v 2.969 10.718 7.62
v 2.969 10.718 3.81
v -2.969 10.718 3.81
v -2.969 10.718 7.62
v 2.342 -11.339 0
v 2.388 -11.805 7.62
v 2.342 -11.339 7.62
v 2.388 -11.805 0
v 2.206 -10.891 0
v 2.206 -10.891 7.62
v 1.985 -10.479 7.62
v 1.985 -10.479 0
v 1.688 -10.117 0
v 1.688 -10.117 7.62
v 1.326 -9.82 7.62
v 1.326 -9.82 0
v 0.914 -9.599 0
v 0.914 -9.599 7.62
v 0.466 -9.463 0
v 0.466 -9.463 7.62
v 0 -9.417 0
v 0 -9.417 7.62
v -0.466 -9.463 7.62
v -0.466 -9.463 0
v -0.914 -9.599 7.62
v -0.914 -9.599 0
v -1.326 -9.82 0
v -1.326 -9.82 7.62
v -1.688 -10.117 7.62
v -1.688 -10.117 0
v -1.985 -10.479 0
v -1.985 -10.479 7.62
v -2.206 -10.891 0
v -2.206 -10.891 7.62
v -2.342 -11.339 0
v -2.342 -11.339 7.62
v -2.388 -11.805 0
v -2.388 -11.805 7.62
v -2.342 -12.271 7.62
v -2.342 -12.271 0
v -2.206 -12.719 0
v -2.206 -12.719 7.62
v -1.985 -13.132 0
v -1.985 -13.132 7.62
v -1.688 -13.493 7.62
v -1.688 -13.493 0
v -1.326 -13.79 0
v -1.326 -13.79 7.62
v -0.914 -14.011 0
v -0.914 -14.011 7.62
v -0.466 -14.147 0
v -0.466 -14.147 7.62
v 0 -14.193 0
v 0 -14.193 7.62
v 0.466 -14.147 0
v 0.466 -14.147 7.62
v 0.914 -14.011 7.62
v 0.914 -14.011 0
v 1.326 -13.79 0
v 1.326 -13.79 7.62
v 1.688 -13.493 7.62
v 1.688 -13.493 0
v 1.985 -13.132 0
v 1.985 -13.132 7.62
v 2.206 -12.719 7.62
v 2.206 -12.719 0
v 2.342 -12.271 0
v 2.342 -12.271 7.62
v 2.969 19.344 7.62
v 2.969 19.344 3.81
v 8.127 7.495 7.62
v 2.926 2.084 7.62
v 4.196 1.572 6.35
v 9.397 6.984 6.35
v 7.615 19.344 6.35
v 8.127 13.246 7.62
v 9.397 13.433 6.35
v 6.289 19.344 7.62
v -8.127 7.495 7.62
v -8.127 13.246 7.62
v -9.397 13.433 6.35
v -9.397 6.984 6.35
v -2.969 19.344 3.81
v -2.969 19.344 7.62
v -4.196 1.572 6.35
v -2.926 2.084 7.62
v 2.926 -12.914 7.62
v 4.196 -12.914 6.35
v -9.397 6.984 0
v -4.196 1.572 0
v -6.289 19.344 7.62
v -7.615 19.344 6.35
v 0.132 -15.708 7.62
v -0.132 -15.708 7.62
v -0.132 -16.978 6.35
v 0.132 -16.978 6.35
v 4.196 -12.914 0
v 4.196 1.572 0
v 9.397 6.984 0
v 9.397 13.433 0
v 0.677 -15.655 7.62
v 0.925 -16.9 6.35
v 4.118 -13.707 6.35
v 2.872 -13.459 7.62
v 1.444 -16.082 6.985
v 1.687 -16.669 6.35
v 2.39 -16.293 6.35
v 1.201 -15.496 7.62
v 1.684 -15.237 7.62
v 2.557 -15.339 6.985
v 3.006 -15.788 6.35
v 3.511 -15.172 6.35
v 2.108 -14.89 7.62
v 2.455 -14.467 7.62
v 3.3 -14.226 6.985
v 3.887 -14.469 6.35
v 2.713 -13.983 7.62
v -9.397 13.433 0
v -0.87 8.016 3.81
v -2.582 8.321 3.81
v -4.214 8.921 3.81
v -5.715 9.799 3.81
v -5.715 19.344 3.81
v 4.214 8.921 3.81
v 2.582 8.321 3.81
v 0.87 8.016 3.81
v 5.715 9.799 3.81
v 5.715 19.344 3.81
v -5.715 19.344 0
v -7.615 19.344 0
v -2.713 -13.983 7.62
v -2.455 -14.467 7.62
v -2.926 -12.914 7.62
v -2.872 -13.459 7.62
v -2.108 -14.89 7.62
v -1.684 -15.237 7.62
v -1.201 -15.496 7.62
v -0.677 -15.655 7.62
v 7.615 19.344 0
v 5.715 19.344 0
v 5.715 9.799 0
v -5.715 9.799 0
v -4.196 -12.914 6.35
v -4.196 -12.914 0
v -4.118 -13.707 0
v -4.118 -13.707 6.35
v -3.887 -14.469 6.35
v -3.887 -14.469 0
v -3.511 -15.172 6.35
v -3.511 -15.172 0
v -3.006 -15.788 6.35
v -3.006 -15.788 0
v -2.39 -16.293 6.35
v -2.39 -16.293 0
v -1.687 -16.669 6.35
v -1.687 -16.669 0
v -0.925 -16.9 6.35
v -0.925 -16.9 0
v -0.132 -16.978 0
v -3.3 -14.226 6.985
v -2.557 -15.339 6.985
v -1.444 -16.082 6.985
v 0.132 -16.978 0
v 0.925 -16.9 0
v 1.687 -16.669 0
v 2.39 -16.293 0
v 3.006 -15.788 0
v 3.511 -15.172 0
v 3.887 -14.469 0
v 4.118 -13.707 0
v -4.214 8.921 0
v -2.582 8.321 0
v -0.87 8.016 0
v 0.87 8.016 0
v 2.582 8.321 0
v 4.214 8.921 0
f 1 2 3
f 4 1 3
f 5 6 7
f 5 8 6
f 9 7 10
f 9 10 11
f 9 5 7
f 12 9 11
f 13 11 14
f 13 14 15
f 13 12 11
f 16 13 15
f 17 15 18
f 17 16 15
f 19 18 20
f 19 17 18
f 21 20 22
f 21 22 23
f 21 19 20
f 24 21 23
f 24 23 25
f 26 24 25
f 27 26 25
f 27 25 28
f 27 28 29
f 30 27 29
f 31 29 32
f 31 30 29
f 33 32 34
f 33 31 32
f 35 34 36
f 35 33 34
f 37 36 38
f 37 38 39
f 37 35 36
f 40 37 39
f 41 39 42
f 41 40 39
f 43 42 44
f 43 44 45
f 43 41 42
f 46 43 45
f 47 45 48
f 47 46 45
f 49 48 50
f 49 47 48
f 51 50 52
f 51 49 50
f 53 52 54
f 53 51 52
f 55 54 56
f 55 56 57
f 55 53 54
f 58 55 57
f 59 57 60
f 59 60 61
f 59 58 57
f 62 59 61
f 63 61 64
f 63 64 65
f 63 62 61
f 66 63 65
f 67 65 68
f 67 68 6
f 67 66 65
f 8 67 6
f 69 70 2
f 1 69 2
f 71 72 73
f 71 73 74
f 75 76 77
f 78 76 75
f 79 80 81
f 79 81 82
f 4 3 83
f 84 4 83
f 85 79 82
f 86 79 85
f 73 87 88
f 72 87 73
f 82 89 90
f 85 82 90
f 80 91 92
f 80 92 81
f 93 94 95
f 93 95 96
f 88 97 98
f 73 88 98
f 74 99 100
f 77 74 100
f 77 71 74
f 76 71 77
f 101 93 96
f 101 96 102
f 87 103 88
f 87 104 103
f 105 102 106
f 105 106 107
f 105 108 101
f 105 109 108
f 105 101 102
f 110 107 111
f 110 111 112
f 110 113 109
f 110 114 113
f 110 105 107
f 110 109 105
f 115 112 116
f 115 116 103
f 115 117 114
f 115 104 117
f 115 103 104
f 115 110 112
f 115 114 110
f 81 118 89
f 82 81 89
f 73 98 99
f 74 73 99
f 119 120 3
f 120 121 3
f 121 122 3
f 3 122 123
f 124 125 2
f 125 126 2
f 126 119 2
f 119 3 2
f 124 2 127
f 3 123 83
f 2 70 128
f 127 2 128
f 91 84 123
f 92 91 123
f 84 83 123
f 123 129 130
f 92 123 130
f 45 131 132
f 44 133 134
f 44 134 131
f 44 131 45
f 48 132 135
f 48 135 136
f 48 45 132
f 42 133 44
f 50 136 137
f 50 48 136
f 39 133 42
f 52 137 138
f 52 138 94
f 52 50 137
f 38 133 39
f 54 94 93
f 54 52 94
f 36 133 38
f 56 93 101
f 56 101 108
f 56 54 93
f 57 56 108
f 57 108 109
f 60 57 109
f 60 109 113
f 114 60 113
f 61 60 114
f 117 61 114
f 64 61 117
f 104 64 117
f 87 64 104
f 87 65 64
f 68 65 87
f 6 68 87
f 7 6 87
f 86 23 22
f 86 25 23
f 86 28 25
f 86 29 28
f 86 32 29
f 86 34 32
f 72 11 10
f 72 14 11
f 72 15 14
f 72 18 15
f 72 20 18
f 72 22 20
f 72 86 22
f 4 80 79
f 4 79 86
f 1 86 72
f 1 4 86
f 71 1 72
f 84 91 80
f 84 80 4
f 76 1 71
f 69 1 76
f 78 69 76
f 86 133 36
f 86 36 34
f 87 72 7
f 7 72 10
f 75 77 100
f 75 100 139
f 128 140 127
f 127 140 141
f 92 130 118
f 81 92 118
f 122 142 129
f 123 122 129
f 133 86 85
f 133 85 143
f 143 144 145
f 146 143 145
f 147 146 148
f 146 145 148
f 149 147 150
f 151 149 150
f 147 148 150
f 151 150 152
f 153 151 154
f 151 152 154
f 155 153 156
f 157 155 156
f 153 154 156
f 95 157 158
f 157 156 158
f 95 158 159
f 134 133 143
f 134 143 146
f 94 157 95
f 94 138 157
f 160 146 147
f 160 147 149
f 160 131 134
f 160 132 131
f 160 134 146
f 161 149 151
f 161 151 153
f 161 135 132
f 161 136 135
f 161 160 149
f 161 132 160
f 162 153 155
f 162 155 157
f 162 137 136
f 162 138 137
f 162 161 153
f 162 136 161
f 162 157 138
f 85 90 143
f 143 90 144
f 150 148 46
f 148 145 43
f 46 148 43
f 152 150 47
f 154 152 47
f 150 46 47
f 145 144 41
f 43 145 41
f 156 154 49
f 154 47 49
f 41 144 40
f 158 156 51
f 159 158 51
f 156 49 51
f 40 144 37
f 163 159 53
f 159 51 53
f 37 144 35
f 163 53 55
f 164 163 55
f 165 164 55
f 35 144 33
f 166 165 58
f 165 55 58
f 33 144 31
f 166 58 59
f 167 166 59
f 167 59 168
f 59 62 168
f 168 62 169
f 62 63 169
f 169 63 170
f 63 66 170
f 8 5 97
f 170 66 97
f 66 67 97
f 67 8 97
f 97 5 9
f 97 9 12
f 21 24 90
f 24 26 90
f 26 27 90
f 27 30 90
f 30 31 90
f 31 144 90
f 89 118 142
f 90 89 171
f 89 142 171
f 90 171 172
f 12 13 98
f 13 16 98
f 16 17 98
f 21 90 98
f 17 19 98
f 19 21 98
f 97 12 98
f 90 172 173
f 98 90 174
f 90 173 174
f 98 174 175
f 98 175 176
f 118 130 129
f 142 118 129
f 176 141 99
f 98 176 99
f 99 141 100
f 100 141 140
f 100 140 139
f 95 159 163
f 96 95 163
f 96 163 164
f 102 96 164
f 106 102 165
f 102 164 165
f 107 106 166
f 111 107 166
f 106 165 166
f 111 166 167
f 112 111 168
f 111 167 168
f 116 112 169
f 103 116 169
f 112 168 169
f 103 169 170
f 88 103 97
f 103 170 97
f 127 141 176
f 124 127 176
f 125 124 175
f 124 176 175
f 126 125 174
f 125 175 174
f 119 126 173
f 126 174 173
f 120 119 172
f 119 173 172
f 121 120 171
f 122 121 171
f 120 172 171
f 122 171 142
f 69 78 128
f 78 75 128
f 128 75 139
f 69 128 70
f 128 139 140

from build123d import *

# Parameters (mm, degrees)
F0_R     = 2.3876
F1_DEPTH = 3.81
F2_R     = 2.3876
F3_DEPTH = 3.81
F4_SIZE  = 1.27


with BuildPart() as f1:
    # F0 (on Top) → F1 (new body)
    with BuildSketch(Plane.XY):
        with BuildLine():
            ThreePointArc((5.715, 9.7989101959), (0, 7.9772757461), (-5.715, 9.7989101959))
            Line((-5.715, 9.7989101959), (-5.715, 19.3437465092))
            Line((-5.715, 19.3437465092), (-7.6151215981, 19.3437465092))
            Line((-7.6151215981, 19.3437465092), (-9.3965170219, 13.432749836))
            Line((-9.3965170219, 13.432749836), (-9.3965170219, 6.983557897))
            Line((-9.3965170219, 6.983557897), (-4.1960714835, 1.5722833676))
            Line((-4.1960714835, 1.5722833676), (-4.1960714835, -12.9142534908))
            ThreePointArc((-4.1960714835, -12.9142534908), (-3.0057534422, -15.7879354495), (-0.1320714835, -16.9782534908))
            Line((-0.1320714835, -16.9782534908), (0, -16.9782534908))
            Line((0, -16.9782534908), (0.1320714835, -16.9782534908))
            ThreePointArc((0.1320714835, -16.9782534908), (3.0057534422, -15.7879354495), (4.1960714835, -12.9142534908))
            Line((4.1960714835, -12.9142534908), (4.1960714835, 1.5722833676))
            Line((4.1960714835, 1.5722833676), (9.3965170219, 6.983557897))
            Line((9.3965170219, 6.983557897), (9.3965170219, 13.432749836))
            Line((9.3965170219, 13.432749836), (7.6151215981, 19.3437465092))
            Line((7.6151215981, 19.3437465092), (5.715, 19.3437465092))
            Line((5.715, 19.3437465092), (5.715, 9.7989101959))
        make_face()
        with Locations((0, -11.8050774974)):
            Circle(F0_R, mode=Mode.SUBTRACT)
    extrude(amount=F1_DEPTH)

    # F2 (on face) → F3 (join)
    with BuildSketch(Plane.XY.offset(3.81)):
        with BuildLine():
            Line((-5.715, 9.7989101959), (-5.715, 19.3437465092))
            Line((-5.715, 19.3437465092), (-7.6151215981, 19.3437465092))
            Line((-7.6151215981, 19.3437465092), (-9.3965170219, 13.432749836))
            Line((-9.3965170219, 13.432749836), (-9.3965170219, 6.983557897))
            Line((-9.3965170219, 6.983557897), (-4.1960714835, 1.5722833676))
            Line((-4.1960714835, 1.5722833676), (-4.1960714835, -12.9142534908))
            ThreePointArc((-4.1960714835, -12.9142534908), (-3.0057534422, -15.7879354495), (-0.1320714835, -16.9782534908))
            Line((-0.1320714835, -16.9782534908), (0.1320714835, -16.9782534908))
            ThreePointArc((0.1320714835, -16.9782534908), (3.0057534422, -15.7879354495), (4.1960714835, -12.9142534908))
            Line((4.1960714835, -12.9142534908), (4.1960714835, 1.5722833676))
            Line((4.1960714835, 1.5722833676), (9.3965170219, 6.983557897))
            Line((9.3965170219, 6.983557897), (9.3965170219, 13.432749836))
            Line((9.3965170219, 13.432749836), (7.6151215981, 19.3437465092))
            Line((7.6151215981, 19.3437465092), (5.715, 19.3437465092))
            Line((5.715, 19.3437465092), (5.715, 9.7989101959))
            ThreePointArc((5.715, 9.7989101959), (0, 7.9772757461), (-5.715, 9.7989101959))
        make_face()
        with Locations((0, -11.8050774974)):
            Circle(F2_R, mode=Mode.SUBTRACT)
        with BuildLine():
            Line((-2.9692309909, 19.3437465092), (-5.715, 19.3437465092))
            Line((-5.715, 19.3437465092), (-5.715, 9.7989101959))
            ThreePointArc((-5.715, 9.7989101959), (0, 7.9772757461), (5.715, 9.7989101959))
            Line((5.715, 9.7989101959), (5.715, 19.3437465092))
            Line((5.715, 19.3437465092), (2.9692309909, 19.3437465092))
            Line((2.9692309909, 19.3437465092), (2.9692309909, 10.7184536755))
            Line((2.9692309909, 10.7184536755), (0, 10.7184536755))
            Line((0, 10.7184536755), (-2.9692309909, 10.7184536755))
            Line((-2.9692309909, 10.7184536755), (-2.9692309909, 19.3437465092))
        make_face()
    extrude(amount=F3_DEPTH)

    # F4
    f4_edges = [f1.edges().sort_by_distance(p)[0] for p in [
        (-8.505819, 16.388248, 7.62),
        (-9.396517, 10.208154, 7.62),
        (-6.796294, 4.277921, 7.62),
        (-4.196071, -5.670985, 7.62),
        (6.796294, 4.277921, 7.62),
        (9.396517, 10.208154, 7.62),
        (8.505819, 16.388248, 7.62),
    ]]
    chamfer(f4_edges, length=F4_SIZE)


solid = f1.part
